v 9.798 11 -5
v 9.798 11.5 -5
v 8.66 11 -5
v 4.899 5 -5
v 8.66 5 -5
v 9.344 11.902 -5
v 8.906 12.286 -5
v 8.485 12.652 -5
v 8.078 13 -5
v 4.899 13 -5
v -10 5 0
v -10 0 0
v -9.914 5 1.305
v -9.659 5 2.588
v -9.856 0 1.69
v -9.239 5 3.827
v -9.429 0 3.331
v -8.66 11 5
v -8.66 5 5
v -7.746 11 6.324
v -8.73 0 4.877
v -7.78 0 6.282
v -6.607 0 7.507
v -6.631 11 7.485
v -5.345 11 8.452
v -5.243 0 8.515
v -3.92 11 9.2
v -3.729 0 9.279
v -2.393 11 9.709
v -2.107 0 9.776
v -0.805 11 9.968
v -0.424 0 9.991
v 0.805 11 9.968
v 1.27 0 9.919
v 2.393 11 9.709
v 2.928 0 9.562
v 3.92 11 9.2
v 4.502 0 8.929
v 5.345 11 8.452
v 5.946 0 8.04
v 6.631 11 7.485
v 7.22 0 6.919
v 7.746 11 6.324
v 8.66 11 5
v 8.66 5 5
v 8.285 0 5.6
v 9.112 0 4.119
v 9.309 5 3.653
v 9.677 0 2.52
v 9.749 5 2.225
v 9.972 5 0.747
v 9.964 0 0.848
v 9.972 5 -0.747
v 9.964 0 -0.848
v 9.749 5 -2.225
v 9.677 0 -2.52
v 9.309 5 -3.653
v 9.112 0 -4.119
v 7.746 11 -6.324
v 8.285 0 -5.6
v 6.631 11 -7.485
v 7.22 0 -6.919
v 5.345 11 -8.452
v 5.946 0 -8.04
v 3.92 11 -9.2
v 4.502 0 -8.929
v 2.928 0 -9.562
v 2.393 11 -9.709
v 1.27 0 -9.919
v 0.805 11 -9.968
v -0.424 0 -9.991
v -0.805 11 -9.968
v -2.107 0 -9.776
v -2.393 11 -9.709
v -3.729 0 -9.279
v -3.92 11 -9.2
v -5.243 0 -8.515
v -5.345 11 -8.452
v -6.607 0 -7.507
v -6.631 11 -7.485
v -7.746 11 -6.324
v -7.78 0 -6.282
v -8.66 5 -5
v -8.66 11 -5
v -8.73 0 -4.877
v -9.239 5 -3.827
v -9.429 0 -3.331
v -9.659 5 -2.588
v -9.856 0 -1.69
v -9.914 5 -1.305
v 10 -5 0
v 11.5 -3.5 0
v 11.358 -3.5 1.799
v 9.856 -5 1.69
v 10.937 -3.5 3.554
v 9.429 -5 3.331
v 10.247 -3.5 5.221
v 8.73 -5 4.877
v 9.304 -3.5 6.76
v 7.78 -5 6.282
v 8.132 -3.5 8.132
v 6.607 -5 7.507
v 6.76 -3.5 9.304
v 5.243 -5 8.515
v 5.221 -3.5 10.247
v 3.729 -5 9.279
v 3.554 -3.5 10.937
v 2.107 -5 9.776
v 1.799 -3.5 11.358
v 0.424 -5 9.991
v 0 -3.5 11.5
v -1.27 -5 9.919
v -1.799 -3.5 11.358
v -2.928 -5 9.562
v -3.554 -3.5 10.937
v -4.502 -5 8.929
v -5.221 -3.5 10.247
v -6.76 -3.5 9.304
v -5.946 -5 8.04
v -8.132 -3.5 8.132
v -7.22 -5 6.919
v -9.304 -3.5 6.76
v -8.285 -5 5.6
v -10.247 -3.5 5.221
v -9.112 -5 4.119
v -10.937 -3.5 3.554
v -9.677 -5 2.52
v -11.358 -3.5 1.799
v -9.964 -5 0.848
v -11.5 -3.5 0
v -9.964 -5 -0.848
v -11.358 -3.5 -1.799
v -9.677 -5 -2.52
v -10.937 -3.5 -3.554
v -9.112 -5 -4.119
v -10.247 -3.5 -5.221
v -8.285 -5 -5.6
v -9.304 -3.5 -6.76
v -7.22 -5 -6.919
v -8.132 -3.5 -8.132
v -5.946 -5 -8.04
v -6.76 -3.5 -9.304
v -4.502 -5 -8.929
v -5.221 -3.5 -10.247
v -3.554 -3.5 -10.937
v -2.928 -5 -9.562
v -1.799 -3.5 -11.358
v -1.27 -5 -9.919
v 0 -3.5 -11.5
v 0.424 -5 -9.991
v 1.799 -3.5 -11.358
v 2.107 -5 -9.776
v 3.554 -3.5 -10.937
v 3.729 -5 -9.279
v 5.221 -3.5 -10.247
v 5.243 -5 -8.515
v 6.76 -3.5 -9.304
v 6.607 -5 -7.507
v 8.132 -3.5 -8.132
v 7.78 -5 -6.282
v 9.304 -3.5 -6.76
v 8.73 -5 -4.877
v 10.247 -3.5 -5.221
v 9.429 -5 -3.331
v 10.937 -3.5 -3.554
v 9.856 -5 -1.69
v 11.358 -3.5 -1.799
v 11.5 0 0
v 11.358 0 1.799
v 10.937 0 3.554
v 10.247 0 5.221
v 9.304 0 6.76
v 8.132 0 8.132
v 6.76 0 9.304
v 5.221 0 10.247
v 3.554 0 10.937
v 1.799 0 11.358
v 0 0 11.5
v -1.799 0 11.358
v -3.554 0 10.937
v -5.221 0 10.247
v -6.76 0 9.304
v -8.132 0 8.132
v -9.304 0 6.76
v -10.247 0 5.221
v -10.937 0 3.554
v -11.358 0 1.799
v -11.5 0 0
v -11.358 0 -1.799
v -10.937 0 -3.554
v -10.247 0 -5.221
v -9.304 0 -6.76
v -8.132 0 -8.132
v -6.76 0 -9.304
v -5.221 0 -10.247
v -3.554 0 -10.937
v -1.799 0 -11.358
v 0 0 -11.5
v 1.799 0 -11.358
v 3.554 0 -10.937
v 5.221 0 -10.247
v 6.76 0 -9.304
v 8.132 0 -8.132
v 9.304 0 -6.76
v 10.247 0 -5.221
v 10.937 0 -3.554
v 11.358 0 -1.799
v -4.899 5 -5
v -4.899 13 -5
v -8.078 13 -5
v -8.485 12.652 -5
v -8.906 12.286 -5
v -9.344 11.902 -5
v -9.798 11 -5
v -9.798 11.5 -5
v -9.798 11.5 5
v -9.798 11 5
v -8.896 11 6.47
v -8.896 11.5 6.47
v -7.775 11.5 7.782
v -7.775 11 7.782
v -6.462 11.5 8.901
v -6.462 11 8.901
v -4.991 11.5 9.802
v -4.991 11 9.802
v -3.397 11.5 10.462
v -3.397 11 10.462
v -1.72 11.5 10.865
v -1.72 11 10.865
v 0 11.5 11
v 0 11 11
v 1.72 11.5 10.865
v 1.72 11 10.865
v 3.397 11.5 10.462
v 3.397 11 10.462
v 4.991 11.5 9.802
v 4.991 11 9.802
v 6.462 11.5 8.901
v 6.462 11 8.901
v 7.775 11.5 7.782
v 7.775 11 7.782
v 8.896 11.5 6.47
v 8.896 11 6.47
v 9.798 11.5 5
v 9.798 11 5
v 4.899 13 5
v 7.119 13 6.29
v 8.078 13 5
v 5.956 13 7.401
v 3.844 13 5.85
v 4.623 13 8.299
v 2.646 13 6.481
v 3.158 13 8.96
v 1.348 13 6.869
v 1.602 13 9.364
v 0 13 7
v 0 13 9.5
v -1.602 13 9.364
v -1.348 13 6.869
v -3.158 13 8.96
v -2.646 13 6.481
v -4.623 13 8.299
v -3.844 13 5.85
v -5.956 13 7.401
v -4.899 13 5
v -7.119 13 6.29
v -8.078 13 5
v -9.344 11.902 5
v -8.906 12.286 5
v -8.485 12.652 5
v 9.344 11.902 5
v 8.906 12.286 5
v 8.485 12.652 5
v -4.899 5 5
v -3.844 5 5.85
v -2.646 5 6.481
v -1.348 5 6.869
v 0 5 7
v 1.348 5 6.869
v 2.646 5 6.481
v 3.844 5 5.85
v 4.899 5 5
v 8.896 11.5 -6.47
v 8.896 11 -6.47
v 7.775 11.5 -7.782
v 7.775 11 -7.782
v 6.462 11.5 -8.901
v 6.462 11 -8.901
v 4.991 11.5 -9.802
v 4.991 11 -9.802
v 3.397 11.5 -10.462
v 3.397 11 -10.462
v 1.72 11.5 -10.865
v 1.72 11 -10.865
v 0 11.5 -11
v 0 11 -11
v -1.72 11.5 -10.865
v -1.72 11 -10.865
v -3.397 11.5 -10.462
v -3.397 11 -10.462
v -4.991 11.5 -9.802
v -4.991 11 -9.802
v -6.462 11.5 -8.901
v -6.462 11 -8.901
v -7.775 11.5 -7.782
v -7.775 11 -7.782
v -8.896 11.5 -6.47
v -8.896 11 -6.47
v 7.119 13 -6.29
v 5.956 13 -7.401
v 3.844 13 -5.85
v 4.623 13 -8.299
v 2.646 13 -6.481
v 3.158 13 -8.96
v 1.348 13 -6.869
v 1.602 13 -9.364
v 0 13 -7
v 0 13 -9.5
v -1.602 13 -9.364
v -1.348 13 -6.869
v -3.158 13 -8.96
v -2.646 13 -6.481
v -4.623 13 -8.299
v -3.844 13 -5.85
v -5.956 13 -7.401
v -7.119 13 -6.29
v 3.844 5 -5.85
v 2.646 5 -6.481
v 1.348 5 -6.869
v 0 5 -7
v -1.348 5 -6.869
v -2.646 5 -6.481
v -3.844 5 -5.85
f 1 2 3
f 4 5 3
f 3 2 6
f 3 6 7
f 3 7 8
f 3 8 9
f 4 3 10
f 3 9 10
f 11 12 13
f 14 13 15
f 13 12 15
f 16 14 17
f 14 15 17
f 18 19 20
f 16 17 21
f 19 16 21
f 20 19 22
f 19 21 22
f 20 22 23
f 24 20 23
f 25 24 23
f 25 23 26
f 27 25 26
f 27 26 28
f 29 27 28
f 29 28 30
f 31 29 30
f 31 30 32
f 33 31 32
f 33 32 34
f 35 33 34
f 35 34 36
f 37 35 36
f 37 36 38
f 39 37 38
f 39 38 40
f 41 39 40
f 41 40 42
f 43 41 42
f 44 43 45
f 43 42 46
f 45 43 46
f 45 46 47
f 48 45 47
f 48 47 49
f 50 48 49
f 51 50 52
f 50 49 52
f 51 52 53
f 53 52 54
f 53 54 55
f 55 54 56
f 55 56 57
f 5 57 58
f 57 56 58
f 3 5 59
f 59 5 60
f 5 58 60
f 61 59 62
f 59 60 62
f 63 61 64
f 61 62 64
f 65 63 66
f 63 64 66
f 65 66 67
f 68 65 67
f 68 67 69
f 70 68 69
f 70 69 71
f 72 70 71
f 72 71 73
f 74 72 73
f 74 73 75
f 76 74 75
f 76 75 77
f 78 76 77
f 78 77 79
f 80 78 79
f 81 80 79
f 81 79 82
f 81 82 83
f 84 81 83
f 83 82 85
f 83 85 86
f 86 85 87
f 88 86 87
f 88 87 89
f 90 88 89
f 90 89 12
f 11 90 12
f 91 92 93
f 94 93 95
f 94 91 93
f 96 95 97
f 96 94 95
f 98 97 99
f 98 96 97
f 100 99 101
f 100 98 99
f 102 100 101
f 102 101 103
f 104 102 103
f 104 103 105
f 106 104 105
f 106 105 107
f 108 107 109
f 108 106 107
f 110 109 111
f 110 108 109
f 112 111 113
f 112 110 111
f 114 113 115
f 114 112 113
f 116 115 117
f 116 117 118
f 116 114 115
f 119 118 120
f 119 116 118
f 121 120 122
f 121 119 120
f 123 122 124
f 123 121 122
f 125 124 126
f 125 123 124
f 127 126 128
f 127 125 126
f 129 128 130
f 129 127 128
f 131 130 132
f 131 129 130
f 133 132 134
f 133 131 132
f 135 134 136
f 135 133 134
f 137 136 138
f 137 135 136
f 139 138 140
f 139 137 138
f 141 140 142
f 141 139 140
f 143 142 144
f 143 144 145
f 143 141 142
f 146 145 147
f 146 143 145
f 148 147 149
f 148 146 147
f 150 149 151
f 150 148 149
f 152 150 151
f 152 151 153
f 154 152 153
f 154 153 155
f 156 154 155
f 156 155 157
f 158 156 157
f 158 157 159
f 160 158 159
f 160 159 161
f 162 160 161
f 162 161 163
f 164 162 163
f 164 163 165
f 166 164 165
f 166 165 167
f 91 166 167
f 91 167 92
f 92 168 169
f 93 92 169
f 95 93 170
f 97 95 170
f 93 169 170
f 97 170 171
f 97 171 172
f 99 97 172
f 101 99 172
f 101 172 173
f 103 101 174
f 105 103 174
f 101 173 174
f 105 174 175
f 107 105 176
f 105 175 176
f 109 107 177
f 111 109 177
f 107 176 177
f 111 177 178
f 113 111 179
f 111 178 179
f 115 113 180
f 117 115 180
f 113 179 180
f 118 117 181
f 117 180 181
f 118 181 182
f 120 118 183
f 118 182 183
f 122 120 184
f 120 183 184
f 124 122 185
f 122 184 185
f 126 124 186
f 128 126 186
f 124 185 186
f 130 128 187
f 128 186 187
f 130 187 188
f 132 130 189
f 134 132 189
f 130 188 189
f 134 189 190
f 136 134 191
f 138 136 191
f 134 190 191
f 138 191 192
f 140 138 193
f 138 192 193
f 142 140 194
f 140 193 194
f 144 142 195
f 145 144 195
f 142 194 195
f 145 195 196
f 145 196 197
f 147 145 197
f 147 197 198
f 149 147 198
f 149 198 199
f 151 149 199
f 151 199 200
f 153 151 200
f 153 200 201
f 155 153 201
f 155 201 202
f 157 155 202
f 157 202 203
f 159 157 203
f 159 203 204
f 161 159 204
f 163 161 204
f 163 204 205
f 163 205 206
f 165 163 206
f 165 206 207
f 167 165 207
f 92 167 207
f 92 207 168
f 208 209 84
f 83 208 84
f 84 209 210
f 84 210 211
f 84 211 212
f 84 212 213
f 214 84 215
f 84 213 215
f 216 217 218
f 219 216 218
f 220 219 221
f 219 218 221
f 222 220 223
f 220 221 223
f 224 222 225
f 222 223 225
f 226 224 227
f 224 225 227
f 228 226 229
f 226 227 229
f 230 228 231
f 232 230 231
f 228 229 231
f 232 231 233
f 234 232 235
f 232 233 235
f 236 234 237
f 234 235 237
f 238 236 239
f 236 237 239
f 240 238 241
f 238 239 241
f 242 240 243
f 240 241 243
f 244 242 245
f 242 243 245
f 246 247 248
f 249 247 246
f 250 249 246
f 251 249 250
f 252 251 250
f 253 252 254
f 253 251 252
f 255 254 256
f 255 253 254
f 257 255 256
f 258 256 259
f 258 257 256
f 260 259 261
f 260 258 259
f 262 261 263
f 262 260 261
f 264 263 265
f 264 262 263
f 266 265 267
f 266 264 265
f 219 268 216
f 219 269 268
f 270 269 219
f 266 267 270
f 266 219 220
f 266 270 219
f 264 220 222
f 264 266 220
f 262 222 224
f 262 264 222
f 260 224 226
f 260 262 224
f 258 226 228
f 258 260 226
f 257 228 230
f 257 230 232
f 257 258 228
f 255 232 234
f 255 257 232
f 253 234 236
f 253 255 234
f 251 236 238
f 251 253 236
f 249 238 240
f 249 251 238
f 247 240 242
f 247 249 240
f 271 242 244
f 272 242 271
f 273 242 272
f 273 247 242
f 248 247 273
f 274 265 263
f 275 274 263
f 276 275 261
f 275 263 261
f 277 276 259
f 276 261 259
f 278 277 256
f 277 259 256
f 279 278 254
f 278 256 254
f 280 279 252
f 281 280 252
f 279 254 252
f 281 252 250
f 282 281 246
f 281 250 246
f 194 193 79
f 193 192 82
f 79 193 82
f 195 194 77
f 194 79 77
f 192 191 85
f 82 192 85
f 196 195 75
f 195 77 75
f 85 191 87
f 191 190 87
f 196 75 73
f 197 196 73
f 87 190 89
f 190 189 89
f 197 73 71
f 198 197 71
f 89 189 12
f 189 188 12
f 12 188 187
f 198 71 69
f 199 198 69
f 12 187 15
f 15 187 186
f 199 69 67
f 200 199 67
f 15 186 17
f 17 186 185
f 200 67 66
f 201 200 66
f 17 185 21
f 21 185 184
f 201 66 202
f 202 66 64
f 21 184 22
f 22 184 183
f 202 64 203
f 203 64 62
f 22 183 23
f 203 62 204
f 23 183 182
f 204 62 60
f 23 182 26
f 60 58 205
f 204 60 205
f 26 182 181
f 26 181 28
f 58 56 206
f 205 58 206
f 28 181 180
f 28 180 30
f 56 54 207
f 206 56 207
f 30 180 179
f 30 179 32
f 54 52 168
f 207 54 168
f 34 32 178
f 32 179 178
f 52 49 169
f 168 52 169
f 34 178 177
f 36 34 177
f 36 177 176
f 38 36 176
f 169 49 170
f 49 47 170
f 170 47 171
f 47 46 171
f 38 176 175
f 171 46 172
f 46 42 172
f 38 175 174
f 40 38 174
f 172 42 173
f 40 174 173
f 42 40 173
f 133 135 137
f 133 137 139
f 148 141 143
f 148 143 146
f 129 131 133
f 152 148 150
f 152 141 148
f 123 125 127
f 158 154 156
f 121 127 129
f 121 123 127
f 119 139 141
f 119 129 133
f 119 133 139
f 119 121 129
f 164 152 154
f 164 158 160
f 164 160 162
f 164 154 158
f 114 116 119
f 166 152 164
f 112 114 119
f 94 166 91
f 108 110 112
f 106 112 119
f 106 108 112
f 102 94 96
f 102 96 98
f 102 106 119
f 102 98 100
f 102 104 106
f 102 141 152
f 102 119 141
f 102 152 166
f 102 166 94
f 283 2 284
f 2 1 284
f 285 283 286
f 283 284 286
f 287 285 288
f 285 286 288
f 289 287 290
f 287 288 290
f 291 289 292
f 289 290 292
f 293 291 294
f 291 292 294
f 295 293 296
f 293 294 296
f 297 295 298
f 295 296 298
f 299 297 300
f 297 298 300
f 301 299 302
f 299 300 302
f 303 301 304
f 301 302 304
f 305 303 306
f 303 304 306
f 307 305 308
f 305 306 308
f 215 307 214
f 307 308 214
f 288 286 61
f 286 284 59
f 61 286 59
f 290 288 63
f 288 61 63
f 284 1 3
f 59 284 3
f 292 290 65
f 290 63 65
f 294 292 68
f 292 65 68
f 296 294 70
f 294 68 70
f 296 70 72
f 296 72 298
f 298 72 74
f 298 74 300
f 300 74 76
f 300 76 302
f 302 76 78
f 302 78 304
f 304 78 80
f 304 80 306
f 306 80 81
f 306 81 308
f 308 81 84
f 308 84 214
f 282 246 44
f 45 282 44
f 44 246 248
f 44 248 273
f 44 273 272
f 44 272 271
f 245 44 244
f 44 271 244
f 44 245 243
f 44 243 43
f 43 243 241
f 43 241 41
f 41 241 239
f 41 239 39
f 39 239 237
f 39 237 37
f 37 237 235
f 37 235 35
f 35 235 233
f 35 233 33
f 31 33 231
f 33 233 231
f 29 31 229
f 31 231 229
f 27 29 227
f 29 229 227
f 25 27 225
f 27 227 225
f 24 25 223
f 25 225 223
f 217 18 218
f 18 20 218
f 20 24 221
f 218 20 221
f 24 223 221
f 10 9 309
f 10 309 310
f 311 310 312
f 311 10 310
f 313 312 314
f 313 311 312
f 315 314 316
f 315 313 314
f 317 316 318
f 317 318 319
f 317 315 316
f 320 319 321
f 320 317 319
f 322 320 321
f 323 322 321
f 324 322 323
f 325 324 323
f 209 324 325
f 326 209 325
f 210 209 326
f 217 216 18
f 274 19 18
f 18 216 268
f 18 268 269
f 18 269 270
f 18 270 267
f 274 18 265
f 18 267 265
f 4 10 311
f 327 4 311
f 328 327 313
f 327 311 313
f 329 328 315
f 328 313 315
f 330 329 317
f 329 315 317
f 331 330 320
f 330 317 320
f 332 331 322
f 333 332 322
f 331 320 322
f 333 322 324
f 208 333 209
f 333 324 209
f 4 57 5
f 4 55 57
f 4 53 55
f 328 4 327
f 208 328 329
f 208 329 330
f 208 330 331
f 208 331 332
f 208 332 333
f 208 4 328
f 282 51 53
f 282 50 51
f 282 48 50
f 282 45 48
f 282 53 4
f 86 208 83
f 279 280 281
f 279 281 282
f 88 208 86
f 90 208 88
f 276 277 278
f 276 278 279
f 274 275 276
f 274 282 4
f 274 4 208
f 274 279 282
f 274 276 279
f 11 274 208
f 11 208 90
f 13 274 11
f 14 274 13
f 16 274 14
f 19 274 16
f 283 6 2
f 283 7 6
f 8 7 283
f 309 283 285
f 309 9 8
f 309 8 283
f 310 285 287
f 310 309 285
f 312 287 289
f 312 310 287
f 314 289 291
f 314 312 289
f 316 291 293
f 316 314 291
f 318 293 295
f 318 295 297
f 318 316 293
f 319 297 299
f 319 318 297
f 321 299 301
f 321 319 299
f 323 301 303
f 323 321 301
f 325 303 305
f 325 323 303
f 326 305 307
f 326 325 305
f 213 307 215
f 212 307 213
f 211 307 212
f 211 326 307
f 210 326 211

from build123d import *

# Parameters (mm, degrees)
F0_R     = 11.5
F1_DEPTH = 5
F2_R     = 10
F3_DEPTH = 11
F4_R     = 11
F5_DEPTH = 2
F6_SIZE  = 1.5
F7_SIZE  = 1.5
F9_DEPTH = 8


with BuildPart() as f1:
    # F0 (on Front) → F1 (new body)
    with BuildSketch(Plane.XZ):
        Circle(F0_R)
    extrude(amount=F1_DEPTH)

    # F2 (on face) → F3 (join)
    with BuildSketch(Plane(origin=(0, 0, 0), x_dir=(-1, 0, 0), z_dir=(0, 1, 0))):
        Circle(F2_R)
    extrude(amount=F3_DEPTH)

    # F4 (on face) → F5 (join)
    with BuildSketch(Plane(origin=(0, 11, 0), x_dir=(-1, 0, 0), z_dir=(0, 1, 0))):
        Circle(F4_R)
    extrude(amount=F5_DEPTH)

    # F6
    f6_edges = [f1.edges().sort_by_distance(p)[0] for p in [
        (11, 13, 0),
    ]]
    chamfer(f6_edges, length=F6_SIZE)

    # F7
    f7_edges = [f1.edges().sort_by_distance(p)[0] for p in [
        (-11.5, -5, 0),
    ]]
    chamfer(f7_edges, length=F7_SIZE)

    # F8 (on face) → F9 (cut)
    with BuildSketch(Plane(origin=(0, 13, 0), x_dir=(-1, 0, 0), z_dir=(0, 1, 0))):
        with BuildLine():
            Line((-8.077747, 5), (-17.5, 5))
            Line((-17.5, 5), (-17.5, -5))
            Line((-17.5, -5), (-8.077747, -5))
            ThreePointArc((-8.077747, -5), (-9.5, 0), (-8.077747, 5))
        make_face()
        with BuildLine():
            Line((17.5, 5), (8.077747, 5))
            ThreePointArc((8.077747, 5), (9.137522, 2.599173), (9.5, 0))
            ThreePointArc((9.5, 0), (9.137522, -2.599173), (8.077747, -5))
            Line((8.077747, -5), (17.5, -5))
            Line((17.5, -5), (17.5, 5))
        make_face()
        with BuildLine():
            Line((-4.898979, 5), (-8.077747, 5))
            ThreePointArc((-8.077747, 5), (-9.5, 0), (-8.077747, -5))
            Line((-8.077747, -5), (-4.898979, -5))
            ThreePointArc((-4.898979, -5), (0, -7), (4.898979, -5))
            Line((4.898979, -5), (8.077747, -5))
            ThreePointArc((8.077747, -5), (9.137522, -2.599173), (9.5, 0))
            ThreePointArc((9.5, 0), (9.137522, 2.599173), (8.077747, 5))
            Line((8.077747, 5), (4.898979, 5))
            ThreePointArc((4.898979, 5), (0, 7), (-4.898979, 5))
        make_face()
    extrude(amount=-F9_DEPTH, mode=Mode.SUBTRACT)


solid = f1.part
